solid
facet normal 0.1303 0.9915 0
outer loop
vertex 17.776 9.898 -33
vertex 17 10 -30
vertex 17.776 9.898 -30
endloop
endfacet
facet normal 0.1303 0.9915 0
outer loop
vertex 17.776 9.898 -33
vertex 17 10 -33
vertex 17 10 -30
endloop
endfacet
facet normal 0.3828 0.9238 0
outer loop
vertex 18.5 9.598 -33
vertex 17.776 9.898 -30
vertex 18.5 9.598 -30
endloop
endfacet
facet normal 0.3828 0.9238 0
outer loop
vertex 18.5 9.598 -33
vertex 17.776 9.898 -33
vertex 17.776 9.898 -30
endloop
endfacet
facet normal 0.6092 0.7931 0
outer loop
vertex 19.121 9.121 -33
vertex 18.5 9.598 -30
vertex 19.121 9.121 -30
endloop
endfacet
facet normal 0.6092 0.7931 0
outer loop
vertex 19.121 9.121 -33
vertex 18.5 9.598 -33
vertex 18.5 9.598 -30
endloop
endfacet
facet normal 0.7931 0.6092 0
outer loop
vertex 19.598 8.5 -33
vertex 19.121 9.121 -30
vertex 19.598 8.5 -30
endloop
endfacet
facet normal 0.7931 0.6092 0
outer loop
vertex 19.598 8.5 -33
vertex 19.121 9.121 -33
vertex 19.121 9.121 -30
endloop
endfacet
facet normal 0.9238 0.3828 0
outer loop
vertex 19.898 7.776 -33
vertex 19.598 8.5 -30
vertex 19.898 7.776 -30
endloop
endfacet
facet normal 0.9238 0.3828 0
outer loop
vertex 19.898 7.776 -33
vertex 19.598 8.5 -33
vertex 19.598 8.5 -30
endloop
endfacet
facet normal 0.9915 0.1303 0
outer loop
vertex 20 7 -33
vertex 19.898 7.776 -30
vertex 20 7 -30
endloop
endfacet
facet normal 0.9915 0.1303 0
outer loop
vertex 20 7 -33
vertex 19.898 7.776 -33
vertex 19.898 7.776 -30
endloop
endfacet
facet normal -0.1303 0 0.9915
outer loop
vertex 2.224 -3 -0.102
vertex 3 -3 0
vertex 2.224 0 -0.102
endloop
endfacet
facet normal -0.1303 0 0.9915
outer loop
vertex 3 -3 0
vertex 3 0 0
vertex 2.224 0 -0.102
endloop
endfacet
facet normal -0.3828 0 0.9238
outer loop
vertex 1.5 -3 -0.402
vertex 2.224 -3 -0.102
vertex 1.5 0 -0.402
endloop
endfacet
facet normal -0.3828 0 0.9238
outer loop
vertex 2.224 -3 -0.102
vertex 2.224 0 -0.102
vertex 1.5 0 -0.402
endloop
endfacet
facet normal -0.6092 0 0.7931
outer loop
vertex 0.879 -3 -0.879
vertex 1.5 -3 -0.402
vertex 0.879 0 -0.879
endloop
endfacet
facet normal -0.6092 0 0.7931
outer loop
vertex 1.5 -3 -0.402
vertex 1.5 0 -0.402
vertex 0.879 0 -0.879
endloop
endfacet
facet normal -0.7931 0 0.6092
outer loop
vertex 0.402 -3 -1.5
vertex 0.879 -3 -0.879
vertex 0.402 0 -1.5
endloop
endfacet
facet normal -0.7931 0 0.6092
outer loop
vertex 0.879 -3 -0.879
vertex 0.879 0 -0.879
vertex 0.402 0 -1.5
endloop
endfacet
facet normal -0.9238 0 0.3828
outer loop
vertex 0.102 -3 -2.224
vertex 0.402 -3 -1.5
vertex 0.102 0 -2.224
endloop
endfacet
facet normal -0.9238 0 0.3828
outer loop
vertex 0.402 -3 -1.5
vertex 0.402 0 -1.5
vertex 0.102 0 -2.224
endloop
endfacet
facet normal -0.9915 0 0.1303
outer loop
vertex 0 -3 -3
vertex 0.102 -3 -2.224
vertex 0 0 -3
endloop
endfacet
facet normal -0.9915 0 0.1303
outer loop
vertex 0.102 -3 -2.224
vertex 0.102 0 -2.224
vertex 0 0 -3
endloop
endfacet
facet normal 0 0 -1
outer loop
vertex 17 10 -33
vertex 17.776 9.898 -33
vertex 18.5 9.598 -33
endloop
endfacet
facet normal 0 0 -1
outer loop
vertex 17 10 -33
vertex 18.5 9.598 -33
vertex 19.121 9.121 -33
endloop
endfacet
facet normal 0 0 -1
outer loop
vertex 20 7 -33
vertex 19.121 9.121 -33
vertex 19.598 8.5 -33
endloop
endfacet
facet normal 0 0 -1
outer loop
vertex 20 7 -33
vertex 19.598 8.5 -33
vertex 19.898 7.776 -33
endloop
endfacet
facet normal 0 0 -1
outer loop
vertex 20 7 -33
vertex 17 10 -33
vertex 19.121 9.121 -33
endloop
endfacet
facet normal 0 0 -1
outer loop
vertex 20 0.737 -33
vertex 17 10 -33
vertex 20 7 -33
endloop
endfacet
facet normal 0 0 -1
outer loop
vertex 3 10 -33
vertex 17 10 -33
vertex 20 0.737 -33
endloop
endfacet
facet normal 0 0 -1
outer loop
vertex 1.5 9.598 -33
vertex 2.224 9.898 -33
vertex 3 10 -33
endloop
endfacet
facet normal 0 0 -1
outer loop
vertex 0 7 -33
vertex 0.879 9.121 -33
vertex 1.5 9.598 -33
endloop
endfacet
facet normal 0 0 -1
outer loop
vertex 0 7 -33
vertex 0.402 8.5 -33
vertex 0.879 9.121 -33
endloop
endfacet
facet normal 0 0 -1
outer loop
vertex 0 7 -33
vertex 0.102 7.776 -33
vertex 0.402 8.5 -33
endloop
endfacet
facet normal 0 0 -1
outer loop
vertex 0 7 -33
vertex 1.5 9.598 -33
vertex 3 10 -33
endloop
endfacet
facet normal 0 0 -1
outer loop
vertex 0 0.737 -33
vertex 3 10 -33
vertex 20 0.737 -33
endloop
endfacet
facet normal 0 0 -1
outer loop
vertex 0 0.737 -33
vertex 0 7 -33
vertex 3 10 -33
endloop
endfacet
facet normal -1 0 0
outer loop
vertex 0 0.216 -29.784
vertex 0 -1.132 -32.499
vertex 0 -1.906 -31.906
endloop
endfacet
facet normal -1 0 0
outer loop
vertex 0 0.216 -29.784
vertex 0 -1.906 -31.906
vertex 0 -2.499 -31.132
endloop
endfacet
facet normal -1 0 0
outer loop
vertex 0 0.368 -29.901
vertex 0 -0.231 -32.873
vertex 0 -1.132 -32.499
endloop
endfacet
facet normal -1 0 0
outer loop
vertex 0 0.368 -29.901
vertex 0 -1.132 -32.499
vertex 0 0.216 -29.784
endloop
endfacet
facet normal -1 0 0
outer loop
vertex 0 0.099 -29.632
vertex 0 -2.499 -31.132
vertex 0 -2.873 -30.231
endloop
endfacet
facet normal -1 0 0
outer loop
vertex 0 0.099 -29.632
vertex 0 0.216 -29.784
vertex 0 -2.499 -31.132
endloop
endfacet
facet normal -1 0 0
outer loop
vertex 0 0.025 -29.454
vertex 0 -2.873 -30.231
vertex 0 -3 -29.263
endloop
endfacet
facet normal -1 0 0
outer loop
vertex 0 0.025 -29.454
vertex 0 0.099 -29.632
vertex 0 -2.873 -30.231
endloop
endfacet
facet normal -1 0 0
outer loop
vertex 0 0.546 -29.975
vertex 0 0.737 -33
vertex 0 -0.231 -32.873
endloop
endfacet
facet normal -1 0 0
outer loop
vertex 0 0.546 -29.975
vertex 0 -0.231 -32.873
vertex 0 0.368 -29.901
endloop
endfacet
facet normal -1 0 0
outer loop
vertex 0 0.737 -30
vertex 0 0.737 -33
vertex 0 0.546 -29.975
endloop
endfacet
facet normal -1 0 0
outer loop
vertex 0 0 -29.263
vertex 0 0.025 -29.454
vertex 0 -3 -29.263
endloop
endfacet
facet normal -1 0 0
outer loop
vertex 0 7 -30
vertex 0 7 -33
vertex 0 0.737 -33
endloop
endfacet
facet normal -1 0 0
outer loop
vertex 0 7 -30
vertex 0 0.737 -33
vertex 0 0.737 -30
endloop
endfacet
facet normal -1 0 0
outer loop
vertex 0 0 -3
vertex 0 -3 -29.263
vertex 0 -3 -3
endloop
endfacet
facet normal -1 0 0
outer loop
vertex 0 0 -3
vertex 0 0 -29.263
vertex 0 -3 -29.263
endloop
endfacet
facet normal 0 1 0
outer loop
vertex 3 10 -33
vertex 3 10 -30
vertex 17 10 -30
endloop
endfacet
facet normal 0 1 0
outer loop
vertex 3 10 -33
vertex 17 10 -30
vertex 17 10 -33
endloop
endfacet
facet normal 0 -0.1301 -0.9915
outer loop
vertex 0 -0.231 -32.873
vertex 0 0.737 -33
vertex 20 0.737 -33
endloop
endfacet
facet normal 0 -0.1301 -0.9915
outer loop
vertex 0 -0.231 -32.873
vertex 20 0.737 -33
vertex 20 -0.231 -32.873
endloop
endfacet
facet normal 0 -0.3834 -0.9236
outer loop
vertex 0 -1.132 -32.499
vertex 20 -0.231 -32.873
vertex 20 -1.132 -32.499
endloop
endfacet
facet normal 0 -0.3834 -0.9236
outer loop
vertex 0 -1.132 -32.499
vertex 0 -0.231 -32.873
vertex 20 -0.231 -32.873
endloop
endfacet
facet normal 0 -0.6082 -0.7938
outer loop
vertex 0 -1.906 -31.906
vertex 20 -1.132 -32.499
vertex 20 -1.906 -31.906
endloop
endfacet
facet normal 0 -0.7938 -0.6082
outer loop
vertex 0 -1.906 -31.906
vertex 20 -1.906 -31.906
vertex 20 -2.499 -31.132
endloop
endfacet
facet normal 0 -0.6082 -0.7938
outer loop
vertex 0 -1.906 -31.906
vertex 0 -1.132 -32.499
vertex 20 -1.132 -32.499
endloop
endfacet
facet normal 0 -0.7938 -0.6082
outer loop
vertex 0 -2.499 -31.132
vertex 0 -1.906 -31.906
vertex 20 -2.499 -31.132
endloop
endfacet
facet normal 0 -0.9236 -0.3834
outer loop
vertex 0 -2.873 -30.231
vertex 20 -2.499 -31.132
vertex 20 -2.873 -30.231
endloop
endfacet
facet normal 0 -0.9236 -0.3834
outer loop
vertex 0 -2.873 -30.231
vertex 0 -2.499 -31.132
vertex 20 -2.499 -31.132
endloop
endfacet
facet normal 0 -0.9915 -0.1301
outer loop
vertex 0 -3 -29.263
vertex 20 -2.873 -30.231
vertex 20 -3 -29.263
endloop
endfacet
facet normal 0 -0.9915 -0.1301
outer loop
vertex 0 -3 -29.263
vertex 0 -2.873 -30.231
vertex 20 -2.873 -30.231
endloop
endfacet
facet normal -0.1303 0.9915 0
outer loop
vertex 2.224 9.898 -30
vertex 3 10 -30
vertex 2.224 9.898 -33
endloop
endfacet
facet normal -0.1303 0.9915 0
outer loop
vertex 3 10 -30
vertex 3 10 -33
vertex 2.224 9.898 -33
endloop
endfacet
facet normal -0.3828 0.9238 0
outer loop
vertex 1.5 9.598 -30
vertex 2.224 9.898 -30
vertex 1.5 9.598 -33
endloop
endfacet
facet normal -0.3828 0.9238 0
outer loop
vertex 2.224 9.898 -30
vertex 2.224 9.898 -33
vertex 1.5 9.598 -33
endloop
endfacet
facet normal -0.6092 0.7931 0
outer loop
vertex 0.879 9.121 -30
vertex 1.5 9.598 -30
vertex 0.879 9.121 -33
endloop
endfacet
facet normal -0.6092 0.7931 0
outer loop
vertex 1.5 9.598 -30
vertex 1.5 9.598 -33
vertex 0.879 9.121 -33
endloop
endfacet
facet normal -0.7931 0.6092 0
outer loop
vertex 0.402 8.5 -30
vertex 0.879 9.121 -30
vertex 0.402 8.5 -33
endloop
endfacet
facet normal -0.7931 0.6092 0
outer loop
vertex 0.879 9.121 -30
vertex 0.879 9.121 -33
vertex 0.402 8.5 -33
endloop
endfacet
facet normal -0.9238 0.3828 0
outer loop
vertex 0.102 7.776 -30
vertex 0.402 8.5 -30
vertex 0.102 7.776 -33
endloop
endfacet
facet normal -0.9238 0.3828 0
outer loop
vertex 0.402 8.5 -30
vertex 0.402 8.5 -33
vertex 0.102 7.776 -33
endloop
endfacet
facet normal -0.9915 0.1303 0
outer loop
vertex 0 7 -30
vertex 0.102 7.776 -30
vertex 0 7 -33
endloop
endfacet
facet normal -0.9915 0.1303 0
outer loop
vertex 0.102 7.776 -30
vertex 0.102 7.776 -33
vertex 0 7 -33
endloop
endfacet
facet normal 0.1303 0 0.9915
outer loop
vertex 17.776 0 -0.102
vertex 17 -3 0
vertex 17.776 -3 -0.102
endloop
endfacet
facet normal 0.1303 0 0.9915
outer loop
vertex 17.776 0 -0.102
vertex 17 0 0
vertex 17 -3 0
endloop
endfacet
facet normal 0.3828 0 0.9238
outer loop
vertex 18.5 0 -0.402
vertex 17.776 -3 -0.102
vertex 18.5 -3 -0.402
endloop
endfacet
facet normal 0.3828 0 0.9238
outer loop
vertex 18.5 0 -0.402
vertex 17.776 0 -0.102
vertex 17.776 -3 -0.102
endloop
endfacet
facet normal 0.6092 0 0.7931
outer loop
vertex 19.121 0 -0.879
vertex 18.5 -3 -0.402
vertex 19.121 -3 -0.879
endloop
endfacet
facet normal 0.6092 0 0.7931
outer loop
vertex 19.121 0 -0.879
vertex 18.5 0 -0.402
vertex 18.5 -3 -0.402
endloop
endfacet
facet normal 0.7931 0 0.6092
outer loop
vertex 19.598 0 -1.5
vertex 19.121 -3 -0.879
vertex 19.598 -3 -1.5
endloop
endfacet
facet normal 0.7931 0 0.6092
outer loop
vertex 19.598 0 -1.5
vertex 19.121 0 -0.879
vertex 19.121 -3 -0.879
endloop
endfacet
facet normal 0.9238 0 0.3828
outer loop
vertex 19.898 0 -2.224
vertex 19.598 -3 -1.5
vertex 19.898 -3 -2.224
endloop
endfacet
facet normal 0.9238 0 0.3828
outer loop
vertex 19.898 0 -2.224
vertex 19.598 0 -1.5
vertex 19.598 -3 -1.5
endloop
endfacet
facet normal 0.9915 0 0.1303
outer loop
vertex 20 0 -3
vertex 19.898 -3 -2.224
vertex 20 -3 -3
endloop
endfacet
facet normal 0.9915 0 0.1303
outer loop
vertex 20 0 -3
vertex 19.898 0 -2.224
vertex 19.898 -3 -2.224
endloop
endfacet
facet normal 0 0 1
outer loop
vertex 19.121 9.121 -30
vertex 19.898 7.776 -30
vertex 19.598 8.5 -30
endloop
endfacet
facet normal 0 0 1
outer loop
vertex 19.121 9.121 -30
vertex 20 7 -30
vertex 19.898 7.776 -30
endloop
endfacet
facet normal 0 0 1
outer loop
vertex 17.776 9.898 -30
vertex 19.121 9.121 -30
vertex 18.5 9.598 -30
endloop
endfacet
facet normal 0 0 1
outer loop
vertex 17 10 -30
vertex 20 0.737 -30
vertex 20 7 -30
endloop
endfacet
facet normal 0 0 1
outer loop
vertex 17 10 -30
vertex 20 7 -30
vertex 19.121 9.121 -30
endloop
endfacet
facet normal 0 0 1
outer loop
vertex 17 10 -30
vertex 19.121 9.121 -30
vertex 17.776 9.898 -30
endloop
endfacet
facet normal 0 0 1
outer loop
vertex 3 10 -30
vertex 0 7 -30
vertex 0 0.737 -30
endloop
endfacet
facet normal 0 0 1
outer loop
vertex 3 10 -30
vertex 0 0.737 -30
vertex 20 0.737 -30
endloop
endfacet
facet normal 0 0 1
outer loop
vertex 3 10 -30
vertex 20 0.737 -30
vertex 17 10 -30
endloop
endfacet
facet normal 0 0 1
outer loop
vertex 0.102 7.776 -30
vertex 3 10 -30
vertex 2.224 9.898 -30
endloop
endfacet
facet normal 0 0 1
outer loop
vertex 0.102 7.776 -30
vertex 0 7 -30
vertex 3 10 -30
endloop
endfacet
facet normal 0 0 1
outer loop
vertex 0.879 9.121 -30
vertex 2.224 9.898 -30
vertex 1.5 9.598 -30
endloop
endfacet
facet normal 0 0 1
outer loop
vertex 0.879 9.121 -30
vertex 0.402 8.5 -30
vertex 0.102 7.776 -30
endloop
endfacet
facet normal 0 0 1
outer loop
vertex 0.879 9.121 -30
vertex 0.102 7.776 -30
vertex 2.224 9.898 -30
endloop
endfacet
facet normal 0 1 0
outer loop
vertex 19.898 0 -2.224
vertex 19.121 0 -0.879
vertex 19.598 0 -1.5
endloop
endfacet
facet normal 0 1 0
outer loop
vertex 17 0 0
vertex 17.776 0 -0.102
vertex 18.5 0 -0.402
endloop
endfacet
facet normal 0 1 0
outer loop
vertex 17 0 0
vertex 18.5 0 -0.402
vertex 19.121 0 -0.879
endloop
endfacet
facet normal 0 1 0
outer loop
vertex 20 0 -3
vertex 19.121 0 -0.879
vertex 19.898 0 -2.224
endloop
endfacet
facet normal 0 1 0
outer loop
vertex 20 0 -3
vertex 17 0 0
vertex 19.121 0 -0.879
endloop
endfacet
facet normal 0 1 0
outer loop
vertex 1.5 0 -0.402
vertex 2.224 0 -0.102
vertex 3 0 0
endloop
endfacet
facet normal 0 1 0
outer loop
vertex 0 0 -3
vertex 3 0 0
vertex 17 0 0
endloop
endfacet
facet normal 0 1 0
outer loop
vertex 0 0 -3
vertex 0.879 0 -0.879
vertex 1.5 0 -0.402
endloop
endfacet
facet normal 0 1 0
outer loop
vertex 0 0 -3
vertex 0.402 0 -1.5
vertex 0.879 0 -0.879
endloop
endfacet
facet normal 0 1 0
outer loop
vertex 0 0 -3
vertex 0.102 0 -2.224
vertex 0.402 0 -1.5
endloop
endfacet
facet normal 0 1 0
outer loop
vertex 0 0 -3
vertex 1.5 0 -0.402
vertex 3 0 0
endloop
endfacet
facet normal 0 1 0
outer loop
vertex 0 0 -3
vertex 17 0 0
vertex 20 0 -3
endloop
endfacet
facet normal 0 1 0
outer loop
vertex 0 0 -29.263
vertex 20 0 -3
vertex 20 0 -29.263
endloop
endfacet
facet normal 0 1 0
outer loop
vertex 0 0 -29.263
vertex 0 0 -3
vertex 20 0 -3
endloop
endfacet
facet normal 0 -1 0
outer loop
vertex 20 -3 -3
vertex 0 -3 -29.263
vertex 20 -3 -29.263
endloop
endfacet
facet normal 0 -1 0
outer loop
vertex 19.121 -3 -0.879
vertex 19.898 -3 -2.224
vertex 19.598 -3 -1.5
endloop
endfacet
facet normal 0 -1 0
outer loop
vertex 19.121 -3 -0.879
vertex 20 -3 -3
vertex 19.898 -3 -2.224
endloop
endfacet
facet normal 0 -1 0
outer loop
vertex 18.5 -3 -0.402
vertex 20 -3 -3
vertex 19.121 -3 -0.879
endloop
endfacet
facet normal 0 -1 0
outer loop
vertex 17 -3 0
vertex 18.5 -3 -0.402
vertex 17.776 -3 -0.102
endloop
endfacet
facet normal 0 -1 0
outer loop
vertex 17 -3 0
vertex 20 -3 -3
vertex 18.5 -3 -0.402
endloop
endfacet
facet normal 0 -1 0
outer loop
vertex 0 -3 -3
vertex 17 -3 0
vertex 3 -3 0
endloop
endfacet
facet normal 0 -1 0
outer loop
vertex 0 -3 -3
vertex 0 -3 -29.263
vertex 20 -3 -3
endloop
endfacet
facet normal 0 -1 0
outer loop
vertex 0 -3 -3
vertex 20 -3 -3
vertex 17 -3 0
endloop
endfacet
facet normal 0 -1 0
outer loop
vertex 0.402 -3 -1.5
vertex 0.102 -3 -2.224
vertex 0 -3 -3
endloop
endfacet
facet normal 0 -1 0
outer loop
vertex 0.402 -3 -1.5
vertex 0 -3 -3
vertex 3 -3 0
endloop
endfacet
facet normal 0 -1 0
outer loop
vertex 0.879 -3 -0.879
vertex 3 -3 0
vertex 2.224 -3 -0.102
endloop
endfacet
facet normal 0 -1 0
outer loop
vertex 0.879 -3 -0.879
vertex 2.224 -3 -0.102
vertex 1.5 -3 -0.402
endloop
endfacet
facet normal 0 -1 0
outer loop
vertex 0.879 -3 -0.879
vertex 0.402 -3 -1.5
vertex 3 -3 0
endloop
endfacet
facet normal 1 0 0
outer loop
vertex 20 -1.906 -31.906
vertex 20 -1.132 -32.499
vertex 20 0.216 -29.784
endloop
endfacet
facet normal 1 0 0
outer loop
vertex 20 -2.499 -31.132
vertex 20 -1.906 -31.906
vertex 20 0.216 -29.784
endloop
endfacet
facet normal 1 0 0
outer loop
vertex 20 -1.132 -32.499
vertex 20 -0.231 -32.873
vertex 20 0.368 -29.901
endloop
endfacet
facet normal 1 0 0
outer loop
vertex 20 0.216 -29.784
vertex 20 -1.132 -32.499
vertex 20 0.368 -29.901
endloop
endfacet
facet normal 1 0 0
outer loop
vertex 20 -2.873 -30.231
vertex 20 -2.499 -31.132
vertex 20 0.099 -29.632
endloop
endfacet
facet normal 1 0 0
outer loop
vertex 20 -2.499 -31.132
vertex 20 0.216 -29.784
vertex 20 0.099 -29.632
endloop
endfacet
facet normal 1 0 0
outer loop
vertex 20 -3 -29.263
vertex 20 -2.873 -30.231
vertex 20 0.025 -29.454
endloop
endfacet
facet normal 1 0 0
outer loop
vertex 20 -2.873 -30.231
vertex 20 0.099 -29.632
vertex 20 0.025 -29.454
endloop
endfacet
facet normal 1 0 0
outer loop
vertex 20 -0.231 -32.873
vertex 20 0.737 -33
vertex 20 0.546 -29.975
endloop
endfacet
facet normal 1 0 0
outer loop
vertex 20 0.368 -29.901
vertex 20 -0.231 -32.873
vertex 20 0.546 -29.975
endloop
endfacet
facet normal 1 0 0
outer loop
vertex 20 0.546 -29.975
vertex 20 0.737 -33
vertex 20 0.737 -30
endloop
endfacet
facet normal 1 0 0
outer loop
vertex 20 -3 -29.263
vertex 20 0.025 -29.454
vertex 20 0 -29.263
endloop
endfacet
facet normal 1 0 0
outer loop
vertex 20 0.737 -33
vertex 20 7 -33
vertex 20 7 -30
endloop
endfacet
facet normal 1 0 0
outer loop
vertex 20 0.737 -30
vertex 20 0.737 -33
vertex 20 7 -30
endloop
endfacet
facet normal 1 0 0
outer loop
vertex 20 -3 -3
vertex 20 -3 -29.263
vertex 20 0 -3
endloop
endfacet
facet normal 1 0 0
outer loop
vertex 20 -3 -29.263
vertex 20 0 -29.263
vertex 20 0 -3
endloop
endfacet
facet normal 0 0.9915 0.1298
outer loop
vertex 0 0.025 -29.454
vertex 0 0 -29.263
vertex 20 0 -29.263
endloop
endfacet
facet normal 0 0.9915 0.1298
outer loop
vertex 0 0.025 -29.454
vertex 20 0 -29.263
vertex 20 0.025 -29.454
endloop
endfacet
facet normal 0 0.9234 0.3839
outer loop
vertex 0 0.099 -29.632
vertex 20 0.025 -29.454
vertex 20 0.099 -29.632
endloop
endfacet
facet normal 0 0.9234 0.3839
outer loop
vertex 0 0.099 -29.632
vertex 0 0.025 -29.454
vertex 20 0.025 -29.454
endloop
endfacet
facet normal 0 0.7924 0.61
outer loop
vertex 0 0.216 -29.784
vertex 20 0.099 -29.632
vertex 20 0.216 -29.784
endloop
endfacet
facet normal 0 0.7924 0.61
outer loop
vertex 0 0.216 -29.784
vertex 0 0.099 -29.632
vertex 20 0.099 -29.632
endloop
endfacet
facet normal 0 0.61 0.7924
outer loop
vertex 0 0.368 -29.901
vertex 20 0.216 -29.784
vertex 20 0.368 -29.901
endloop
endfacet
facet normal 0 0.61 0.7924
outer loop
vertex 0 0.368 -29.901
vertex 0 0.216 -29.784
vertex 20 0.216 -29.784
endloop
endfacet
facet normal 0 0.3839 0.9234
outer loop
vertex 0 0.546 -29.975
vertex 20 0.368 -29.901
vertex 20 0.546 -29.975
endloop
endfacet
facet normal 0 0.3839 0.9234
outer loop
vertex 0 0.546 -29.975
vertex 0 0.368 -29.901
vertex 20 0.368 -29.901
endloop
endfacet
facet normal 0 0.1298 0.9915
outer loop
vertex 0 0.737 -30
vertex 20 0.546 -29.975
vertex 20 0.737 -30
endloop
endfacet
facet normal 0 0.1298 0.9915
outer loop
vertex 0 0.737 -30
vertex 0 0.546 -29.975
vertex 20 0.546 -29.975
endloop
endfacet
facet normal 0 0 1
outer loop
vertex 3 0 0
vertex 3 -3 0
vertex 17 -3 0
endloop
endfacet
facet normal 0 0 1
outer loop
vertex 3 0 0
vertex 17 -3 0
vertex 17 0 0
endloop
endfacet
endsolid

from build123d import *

# Parameters (mm, degrees)
BASE_FLANGE1_DEPTH = 20
FILLET1_R          = 3


# Sheet-metal steps are written as plain solids
with BuildPart() as part:
    # Sketch1 → Base-Flange1 (new body)
    with BuildSketch(Plane(origin=(0, 0, 0), x_dir=(0, 0, -1), z_dir=(1, 0, 0))):
        with BuildLine():
            Line((0, 0), (29.2634, 0))
            ThreePointArc((29.2634, 0), (29.784254855, 0.215745145), (30, 0.7366))
            Line((30, 0.7366), (30, 10))
            Line((30, 10), (33, 10))
            Line((33, 10), (33, 0.7366))
            ThreePointArc((33, 0.7366), (31.905575199, -1.905575199), (29.2634, -3))
            Line((29.2634, -3), (0, -3))
            Line((0, -3), (0, 0))
        make_face()
    extrude(amount=BASE_FLANGE1_DEPTH)

    # Fillet1
    fillet1_edges = [part.edges().sort_by_distance(p)[0] for p in [
        (20, -1.5, 0),
        (20, 10, -31.5),
        (0, -1.5, 0),
        (0, 10, -31.5),
    ]]
    fillet(fillet1_edges, radius=FILLET1_R)


solid = part.part
